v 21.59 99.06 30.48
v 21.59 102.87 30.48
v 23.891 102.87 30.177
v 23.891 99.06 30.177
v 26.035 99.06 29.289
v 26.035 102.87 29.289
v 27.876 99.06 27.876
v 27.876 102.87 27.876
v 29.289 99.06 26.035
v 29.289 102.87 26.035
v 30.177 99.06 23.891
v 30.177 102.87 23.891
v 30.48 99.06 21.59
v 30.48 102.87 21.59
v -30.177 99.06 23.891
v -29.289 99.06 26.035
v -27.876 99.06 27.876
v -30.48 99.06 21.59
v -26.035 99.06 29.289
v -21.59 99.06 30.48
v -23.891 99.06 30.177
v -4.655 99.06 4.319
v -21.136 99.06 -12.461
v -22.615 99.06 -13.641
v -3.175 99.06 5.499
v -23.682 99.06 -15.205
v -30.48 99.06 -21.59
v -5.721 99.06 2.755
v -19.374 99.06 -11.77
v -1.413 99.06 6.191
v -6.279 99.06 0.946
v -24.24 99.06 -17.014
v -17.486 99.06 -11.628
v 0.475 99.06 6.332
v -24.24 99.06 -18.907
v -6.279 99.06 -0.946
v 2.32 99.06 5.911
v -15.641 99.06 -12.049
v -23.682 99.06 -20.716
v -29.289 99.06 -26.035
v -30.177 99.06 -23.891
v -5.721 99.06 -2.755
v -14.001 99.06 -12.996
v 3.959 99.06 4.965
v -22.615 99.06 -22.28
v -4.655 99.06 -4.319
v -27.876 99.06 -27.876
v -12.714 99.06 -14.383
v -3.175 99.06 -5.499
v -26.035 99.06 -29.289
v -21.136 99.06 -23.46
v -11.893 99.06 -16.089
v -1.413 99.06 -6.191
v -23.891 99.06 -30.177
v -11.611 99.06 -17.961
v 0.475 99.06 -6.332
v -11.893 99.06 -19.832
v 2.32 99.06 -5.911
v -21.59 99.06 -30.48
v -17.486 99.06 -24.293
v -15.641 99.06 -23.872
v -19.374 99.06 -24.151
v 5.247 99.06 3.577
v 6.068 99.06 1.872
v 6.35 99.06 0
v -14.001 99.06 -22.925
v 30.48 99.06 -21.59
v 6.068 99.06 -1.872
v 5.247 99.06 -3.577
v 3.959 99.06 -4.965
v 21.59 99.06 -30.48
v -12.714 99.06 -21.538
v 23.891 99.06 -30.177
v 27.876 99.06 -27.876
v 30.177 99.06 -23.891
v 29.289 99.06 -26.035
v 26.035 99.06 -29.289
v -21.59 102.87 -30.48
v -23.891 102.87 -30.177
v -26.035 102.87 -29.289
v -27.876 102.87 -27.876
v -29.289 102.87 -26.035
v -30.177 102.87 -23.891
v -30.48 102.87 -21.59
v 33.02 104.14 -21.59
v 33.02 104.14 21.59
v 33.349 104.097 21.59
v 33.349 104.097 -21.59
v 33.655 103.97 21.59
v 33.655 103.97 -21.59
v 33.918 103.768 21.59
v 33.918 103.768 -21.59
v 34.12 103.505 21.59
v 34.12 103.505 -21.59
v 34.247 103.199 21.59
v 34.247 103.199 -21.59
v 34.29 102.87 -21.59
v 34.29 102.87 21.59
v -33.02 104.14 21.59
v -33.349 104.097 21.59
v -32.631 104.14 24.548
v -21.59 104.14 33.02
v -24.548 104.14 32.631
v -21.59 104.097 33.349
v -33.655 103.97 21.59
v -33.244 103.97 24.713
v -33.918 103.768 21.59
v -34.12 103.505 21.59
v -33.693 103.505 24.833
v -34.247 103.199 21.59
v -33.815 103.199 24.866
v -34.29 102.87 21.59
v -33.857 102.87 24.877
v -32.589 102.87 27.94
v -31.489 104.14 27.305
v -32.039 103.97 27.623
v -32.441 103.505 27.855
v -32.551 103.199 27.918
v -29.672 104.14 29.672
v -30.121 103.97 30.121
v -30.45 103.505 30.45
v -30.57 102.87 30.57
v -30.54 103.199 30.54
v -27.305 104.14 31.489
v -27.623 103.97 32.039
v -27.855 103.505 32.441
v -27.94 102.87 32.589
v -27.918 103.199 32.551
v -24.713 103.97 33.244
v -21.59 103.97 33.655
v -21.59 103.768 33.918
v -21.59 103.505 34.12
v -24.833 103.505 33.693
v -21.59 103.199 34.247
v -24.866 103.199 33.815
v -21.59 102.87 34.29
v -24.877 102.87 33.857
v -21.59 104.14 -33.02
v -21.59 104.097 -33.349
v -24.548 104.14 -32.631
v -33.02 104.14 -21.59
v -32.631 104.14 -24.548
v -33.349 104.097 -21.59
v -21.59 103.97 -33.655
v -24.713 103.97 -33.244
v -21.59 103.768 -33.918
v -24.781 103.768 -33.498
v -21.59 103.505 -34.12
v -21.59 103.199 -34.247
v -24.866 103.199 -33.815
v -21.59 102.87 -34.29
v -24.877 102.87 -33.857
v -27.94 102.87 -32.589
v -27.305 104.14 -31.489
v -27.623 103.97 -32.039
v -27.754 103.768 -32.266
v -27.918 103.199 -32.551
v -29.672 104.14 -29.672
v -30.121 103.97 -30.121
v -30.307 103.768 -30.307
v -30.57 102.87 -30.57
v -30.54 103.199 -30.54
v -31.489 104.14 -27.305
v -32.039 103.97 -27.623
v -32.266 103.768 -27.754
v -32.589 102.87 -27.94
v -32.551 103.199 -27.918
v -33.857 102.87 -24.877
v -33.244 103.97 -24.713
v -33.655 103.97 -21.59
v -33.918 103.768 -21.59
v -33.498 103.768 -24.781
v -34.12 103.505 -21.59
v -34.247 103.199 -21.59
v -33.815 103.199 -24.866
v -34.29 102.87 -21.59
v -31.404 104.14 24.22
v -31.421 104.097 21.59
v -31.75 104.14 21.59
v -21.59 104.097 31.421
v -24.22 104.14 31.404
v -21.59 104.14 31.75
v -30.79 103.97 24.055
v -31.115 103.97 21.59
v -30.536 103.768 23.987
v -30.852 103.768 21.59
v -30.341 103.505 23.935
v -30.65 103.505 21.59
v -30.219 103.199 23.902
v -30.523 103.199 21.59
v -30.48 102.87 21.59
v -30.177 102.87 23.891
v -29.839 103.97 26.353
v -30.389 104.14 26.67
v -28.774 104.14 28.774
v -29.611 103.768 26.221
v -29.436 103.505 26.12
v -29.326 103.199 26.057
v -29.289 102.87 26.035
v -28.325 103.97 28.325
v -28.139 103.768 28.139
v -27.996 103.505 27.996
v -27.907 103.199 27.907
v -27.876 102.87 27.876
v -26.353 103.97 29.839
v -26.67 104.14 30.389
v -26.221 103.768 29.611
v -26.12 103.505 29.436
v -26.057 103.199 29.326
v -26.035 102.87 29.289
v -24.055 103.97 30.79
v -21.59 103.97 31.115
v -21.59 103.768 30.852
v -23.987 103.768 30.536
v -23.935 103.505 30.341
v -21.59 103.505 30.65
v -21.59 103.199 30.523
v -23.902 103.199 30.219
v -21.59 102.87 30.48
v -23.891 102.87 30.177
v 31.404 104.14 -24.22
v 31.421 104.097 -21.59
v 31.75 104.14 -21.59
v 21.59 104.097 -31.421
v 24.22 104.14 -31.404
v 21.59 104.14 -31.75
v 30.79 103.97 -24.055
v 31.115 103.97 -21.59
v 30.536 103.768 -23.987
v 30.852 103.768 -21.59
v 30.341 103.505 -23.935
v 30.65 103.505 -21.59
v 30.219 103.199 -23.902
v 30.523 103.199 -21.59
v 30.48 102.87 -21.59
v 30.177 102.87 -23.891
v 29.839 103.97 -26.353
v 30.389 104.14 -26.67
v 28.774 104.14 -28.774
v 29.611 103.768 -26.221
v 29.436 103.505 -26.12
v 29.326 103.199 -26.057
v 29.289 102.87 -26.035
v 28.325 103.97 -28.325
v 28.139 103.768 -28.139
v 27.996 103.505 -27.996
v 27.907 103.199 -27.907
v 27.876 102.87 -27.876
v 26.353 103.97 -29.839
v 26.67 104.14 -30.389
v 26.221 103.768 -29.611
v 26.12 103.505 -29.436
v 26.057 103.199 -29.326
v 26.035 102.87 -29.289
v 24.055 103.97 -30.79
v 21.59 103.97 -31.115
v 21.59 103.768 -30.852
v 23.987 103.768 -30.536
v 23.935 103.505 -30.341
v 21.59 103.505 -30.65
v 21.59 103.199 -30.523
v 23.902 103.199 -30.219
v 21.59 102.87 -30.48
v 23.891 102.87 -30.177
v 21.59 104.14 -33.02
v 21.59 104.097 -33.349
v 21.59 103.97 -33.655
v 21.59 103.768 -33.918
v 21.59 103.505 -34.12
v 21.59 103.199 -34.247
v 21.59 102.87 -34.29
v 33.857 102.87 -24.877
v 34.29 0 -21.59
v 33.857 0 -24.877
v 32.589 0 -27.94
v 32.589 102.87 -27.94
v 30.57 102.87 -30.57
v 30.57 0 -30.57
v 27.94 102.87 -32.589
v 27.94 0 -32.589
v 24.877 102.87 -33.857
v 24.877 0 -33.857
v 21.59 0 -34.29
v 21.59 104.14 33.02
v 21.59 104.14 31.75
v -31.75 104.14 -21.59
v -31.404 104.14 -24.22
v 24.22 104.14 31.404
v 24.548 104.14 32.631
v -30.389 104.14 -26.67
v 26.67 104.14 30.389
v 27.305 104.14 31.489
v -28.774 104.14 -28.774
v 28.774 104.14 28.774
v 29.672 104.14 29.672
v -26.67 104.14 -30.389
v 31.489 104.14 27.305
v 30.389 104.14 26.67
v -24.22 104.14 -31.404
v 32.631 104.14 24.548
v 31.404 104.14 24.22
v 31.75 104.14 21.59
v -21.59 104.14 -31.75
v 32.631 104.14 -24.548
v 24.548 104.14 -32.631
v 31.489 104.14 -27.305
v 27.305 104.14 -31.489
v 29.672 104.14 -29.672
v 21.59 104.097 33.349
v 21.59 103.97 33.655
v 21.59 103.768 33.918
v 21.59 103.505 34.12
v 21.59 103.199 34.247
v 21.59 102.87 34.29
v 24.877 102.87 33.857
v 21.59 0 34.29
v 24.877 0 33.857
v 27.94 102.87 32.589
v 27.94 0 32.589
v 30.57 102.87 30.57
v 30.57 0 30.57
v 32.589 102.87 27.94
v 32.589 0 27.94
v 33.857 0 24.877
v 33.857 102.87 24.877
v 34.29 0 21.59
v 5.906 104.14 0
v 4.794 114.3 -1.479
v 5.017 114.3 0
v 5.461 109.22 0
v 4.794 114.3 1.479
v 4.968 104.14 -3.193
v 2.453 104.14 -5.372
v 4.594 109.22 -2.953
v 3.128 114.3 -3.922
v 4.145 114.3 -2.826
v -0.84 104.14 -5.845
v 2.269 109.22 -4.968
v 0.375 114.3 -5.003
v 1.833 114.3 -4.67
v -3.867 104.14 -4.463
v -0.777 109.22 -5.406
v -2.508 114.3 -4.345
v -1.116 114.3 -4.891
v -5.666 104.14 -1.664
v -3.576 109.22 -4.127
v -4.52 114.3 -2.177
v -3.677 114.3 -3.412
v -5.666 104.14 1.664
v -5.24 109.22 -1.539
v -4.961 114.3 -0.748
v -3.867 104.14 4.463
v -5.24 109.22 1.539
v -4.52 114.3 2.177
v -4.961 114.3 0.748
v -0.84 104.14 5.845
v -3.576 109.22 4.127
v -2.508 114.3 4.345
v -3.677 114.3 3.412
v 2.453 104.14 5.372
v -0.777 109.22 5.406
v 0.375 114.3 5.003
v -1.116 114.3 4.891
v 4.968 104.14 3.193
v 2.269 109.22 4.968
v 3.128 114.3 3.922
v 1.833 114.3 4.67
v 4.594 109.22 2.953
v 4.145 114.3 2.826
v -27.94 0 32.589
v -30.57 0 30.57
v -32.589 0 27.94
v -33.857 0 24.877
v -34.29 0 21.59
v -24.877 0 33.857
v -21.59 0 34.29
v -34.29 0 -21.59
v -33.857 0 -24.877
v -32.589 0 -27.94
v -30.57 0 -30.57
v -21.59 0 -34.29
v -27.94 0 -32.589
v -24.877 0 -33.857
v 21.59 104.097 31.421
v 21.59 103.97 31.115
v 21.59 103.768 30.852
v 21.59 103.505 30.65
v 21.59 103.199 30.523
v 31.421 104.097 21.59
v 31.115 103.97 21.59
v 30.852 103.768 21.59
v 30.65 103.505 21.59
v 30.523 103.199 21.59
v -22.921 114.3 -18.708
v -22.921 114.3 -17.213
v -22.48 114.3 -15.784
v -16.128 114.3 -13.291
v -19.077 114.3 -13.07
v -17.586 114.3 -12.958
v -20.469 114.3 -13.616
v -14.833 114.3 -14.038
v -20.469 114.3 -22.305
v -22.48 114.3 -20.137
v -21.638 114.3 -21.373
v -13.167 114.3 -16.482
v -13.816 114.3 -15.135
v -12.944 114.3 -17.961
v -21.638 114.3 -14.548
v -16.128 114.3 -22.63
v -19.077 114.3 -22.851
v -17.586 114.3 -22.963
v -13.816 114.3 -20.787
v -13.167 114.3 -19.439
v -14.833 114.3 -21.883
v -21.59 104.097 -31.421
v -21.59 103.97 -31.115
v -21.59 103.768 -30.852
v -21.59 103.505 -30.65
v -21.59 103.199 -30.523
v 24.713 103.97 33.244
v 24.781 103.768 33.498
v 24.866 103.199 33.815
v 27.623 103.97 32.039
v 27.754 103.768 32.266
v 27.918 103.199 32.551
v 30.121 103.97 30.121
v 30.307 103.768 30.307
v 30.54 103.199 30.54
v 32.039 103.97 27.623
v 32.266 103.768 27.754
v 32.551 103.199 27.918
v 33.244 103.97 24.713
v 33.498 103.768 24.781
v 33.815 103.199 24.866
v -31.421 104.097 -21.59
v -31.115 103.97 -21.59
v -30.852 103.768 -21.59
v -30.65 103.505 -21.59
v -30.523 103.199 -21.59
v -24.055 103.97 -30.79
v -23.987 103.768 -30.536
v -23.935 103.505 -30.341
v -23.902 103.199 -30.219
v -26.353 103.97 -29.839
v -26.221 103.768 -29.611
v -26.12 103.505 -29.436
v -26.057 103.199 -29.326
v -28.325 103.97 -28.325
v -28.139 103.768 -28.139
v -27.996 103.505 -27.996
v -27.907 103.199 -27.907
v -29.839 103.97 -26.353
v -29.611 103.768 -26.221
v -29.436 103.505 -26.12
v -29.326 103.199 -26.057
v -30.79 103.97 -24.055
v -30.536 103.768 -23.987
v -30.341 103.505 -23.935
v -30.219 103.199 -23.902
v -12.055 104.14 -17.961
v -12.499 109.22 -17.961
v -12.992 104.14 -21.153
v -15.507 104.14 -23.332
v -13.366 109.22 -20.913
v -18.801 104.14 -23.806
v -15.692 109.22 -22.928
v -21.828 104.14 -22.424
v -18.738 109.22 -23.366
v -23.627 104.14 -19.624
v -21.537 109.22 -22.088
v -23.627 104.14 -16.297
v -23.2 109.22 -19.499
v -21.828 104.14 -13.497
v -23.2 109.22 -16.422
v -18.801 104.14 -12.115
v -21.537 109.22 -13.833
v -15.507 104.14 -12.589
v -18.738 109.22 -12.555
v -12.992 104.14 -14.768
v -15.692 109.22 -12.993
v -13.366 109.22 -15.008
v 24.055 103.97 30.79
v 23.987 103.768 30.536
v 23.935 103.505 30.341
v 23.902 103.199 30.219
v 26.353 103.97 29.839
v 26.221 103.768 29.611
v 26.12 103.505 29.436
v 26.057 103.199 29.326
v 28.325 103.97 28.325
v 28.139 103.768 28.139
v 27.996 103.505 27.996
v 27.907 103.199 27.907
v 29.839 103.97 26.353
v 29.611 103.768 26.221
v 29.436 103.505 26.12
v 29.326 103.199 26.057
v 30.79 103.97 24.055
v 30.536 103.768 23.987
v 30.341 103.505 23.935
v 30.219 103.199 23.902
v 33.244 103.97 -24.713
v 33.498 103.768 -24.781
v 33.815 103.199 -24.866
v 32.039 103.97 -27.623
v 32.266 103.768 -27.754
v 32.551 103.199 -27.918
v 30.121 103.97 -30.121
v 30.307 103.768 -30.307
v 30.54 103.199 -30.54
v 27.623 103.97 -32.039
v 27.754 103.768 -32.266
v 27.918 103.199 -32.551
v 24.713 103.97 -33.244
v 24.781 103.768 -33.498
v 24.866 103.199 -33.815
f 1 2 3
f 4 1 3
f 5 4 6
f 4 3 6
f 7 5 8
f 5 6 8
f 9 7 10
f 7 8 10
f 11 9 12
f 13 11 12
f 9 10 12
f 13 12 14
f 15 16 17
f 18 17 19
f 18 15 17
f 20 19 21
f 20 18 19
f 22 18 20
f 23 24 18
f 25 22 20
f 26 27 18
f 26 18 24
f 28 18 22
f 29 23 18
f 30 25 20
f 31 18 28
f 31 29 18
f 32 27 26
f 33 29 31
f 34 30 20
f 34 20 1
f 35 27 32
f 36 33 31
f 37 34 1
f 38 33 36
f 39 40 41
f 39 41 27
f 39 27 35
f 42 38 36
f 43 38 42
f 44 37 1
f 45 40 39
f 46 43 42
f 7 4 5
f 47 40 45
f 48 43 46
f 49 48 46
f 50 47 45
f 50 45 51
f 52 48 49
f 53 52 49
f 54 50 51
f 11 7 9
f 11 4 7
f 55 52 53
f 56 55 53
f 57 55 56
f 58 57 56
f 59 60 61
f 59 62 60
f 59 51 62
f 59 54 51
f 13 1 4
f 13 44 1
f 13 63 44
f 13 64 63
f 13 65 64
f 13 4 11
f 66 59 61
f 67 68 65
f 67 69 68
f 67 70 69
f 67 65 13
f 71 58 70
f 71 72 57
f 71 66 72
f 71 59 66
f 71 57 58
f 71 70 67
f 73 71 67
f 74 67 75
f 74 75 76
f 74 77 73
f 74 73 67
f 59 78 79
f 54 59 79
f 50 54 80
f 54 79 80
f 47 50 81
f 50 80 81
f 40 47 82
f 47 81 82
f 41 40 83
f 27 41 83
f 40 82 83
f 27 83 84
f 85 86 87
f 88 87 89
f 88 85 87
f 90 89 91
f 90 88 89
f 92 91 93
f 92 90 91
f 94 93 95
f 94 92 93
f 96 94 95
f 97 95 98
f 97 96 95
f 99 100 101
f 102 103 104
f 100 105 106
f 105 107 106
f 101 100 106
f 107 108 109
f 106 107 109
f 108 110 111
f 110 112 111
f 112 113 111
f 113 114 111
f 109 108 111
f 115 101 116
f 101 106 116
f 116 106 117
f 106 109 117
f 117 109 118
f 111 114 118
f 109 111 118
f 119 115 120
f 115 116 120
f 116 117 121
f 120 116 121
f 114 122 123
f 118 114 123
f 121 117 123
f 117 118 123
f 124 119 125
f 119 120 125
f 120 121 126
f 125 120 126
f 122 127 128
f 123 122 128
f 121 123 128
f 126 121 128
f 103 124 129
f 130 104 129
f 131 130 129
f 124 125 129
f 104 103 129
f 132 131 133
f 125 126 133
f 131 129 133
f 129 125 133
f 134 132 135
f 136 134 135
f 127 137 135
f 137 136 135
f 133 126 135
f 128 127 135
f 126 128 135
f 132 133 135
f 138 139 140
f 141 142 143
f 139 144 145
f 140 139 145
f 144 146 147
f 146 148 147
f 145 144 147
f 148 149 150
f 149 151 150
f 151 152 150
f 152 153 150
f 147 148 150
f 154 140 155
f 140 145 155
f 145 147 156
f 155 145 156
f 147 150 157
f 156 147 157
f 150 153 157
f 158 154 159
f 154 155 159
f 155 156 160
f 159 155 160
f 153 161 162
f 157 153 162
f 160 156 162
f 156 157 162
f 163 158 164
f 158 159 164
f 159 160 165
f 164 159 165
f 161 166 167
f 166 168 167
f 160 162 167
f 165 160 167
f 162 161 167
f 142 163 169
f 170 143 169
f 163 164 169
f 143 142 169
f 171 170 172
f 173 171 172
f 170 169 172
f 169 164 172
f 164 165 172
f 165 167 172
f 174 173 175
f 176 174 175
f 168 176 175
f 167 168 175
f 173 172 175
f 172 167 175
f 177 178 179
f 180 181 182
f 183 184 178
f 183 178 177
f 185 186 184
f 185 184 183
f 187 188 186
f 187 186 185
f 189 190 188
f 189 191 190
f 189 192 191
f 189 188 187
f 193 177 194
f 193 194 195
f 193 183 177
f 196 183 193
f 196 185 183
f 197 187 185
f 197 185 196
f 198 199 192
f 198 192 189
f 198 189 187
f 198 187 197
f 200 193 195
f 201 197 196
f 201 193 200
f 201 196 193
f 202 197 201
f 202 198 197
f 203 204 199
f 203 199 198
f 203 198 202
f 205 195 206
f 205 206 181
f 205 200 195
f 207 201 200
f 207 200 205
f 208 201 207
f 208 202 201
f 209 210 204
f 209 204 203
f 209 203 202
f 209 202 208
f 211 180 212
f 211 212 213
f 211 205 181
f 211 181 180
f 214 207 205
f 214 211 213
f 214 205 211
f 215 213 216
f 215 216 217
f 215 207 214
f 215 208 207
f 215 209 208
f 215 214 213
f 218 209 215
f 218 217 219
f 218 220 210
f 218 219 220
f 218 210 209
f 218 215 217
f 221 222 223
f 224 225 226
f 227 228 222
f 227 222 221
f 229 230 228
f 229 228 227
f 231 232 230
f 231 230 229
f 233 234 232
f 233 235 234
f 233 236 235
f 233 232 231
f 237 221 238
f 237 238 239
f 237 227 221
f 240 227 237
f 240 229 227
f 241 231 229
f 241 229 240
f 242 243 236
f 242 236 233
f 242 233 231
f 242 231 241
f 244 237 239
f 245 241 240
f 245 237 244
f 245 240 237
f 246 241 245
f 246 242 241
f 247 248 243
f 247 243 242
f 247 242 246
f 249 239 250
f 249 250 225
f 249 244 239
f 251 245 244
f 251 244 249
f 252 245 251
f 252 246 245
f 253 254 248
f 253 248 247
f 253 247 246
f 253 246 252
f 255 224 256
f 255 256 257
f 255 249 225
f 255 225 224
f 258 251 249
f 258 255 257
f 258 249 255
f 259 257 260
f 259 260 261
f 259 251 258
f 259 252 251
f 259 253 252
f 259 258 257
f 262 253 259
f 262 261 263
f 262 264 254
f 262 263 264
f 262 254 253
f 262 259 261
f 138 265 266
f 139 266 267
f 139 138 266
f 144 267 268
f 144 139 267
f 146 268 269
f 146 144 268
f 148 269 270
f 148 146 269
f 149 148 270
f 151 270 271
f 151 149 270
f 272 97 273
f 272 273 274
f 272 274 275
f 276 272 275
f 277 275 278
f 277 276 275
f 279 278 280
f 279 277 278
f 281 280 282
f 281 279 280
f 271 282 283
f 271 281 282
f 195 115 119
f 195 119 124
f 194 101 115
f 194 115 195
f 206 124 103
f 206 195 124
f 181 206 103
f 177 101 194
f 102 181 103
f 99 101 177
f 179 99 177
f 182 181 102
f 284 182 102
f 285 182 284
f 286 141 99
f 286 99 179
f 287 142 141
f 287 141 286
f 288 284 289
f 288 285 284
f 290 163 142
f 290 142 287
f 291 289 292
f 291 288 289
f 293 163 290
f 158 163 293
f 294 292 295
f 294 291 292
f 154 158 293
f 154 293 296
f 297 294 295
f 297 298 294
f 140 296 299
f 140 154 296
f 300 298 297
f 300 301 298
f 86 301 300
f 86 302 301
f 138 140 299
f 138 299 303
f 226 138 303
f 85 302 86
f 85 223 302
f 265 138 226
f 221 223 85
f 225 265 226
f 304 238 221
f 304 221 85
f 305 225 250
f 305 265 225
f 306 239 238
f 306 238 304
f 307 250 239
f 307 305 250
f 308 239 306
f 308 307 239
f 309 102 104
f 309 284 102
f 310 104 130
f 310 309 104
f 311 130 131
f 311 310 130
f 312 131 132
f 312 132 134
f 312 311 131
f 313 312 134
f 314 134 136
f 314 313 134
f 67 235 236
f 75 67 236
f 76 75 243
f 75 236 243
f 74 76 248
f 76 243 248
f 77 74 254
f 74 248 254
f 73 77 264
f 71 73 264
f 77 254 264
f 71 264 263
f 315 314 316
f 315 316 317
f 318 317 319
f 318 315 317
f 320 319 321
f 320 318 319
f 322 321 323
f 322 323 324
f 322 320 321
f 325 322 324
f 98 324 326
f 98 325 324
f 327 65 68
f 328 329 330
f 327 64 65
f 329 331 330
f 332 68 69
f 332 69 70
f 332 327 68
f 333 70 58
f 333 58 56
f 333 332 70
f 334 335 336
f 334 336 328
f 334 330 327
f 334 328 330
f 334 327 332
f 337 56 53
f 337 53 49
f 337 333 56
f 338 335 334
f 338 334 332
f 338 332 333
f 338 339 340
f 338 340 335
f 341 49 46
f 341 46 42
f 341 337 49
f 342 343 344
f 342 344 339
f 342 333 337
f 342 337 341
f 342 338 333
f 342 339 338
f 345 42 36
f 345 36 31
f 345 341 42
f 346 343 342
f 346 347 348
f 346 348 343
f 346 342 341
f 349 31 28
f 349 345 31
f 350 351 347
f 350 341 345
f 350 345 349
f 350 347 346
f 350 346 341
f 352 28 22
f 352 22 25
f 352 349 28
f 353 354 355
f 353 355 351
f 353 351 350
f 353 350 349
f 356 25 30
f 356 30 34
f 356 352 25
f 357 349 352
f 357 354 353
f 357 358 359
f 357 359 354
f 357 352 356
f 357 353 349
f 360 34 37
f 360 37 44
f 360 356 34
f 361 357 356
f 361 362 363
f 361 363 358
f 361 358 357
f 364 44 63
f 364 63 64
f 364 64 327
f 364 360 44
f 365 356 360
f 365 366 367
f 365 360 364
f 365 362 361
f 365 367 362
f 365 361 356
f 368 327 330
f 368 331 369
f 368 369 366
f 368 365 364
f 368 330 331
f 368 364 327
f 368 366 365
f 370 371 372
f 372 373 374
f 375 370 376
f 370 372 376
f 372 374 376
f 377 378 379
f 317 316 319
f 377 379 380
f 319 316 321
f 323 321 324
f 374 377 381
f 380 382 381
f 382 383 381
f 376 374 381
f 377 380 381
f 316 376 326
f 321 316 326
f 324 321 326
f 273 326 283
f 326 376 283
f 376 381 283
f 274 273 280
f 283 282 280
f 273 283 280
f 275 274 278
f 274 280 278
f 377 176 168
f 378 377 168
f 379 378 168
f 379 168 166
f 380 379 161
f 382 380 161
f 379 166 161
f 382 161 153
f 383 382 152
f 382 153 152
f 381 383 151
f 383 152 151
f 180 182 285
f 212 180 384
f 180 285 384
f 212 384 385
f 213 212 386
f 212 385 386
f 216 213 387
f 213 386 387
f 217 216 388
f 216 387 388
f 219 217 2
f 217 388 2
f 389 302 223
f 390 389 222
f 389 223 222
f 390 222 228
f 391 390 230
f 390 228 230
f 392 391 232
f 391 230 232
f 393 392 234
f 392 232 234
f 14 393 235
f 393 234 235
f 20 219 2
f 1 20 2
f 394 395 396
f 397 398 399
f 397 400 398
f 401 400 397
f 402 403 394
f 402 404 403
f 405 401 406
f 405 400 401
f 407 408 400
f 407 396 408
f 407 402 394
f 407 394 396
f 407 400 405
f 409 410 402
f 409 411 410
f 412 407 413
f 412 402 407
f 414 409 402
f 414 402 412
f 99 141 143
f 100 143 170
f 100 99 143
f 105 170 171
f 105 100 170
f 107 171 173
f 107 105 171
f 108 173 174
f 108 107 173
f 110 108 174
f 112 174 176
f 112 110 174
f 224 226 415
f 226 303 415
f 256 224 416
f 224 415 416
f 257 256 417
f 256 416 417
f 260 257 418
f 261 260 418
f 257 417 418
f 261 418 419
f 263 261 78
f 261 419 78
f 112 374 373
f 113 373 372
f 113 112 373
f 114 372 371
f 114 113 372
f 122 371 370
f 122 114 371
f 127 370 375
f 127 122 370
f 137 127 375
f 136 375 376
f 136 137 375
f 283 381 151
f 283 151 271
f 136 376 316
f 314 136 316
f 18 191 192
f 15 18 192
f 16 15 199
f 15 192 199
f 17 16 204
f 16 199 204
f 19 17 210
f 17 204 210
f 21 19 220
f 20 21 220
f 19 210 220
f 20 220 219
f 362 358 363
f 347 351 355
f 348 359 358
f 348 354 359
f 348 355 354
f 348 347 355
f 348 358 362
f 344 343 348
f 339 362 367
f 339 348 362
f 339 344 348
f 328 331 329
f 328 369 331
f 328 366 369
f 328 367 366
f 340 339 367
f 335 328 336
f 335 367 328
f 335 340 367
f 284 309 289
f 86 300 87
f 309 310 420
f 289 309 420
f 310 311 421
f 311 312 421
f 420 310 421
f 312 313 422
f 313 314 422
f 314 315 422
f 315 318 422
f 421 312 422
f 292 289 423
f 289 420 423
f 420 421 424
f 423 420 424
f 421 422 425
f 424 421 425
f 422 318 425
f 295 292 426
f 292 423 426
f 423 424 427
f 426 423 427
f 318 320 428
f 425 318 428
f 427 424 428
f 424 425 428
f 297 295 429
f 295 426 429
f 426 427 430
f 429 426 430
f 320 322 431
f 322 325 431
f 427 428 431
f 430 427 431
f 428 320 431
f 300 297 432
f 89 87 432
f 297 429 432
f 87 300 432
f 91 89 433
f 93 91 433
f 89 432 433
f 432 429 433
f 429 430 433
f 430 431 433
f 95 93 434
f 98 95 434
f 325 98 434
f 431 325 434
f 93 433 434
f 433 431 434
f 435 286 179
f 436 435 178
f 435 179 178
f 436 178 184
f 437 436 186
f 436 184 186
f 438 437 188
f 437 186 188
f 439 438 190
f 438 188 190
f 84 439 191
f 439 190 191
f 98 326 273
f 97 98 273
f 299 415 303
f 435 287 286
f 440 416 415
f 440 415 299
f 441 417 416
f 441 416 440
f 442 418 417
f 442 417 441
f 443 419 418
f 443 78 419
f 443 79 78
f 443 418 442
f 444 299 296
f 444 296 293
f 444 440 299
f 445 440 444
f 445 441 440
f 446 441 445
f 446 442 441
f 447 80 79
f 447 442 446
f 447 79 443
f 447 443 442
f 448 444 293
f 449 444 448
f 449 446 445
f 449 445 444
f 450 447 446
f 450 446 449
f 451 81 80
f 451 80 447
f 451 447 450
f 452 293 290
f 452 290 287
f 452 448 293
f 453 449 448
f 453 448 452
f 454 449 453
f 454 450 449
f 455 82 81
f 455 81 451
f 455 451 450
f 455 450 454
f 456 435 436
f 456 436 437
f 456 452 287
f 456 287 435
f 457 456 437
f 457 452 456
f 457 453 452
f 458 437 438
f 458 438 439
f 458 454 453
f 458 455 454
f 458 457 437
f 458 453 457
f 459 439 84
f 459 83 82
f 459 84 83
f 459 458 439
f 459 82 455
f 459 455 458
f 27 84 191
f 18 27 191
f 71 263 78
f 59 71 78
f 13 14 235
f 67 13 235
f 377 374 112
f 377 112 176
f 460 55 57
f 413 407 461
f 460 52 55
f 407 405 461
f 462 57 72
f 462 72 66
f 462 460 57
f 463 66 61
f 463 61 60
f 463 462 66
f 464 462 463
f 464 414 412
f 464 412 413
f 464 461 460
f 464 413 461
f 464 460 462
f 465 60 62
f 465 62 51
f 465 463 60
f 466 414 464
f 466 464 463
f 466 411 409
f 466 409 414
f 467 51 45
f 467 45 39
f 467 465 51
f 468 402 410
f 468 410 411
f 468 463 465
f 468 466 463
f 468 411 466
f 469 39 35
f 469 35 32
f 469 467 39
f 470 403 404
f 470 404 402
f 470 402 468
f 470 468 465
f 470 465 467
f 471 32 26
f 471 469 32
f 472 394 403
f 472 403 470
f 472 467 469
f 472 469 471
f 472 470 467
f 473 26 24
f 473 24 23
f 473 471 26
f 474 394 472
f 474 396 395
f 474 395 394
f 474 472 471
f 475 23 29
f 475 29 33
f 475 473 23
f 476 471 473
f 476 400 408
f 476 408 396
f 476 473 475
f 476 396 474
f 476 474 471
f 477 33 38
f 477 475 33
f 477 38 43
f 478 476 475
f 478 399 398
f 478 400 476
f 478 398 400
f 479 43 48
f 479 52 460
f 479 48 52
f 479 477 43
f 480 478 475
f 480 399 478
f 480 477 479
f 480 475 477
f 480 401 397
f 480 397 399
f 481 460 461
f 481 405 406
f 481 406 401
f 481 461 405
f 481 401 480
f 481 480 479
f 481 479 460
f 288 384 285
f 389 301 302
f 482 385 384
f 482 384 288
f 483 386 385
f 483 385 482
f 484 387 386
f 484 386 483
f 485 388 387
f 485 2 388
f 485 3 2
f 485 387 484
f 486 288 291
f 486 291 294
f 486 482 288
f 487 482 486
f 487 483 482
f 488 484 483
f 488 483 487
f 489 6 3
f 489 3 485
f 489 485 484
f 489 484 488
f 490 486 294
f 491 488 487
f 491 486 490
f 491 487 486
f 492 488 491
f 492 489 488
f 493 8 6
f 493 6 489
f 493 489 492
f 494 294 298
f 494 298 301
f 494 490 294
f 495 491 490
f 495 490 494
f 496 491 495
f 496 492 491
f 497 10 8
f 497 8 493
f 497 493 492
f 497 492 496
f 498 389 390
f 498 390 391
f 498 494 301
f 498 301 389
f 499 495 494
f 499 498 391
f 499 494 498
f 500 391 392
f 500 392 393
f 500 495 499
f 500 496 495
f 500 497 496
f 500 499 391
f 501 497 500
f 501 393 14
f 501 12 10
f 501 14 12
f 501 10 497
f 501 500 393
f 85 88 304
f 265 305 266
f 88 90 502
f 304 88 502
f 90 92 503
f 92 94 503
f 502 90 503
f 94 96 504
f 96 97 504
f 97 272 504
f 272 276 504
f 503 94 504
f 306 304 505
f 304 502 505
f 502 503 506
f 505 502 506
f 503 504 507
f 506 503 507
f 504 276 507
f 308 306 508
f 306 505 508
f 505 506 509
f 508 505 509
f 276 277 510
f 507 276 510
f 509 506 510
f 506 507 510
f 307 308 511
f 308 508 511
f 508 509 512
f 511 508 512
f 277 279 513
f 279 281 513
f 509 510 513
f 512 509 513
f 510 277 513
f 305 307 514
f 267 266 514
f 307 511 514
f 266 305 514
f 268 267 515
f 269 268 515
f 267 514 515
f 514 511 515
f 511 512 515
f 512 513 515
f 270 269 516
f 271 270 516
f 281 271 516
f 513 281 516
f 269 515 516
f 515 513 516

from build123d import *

# Parameters (mm, degrees)
SKETCH2_W          = 68.58
SKETCH2_H          = 68.58
BASE_EXTRUDE_DEPTH = 104.14
SIDE_FILLETS_R     = 12.7
TOP_CUT_DEPTH      = 5.08
TOP_FACE_FILLET_R  = 1.27
SKETCH9_R          = 6.35
TERMINALS_DEPTH    = 15.24
TERMINALS_TAPER    = 5


with BuildPart() as part:
    # Sketch2 → Base-Extrude (new body)
    with BuildSketch(Plane(origin=(0, 0, 0), x_dir=(1, 0, 0), z_dir=(0, 1, 0))):
        Rectangle(SKETCH2_W, SKETCH2_H)
    extrude(amount=BASE_EXTRUDE_DEPTH)

    # Side Fillets
    side_fillets_edges = [part.edges().sort_by_distance(p)[0] for p in [
        (34.29, 52.07, 34.29),
        (-34.29, 52.07, 34.29),
        (-34.29, 52.07, -34.29),
        (34.29, 52.07, -34.29),
    ]]
    fillet(side_fillets_edges, radius=SIDE_FILLETS_R)

    # Sketch5 → Top Cut (cut)
    with BuildSketch(Plane(origin=(0, 104.14, 0), x_dir=(1, 0, 0), z_dir=(0, 1, 0))):
        with BuildLine():
            Line((-30.48, 21.59), (-30.48, -21.59))
            ThreePointArc((-30.48, -21.59), (-27.876179285, -27.876179285), (-21.59, -30.48))
            Line((-21.59, -30.48), (21.59, -30.48))
            ThreePointArc((21.59, -30.48), (27.876179285, -27.876179285), (30.48, -21.59))
            Line((30.48, -21.59), (30.48, 21.59))
            ThreePointArc((30.48, 21.59), (27.876179285, 27.876179285), (21.59, 30.48))
            Line((21.59, 30.48), (-21.59, 30.48))
            ThreePointArc((-21.59, 30.48), (-27.876179285, 27.876179285), (-30.48, 21.59))
        make_face()
    extrude(amount=-TOP_CUT_DEPTH, mode=Mode.SUBTRACT)

    # Top Face Fillet
    top_face_fillet_edges = [part.edges().sort_by_distance(p)[0] for p in [
        (0, 104.14, 34.29),
        (-34.29, 104.14, 0),
        (34.29, 104.14, 0),
        (0, 104.14, -34.29),
        (30.570256121, 104.14, 30.570256121),
        (30.570256121, 104.14, -30.570256121),
        (-30.570256121, 104.14, -30.570256121),
        (-30.570256121, 104.14, 30.570256121),
        (-27.876179285, 104.14, -27.876179285),
        (-30.48, 104.14, 0),
        (-27.876179285, 104.14, 27.876179285),
        (0, 104.14, 30.48),
        (27.876179285, 104.14, 27.876179285),
        (30.48, 104.14, 0),
        (27.876179285, 104.14, -27.876179285),
        (0, 104.14, -30.48),
    ]]
    fillet(top_face_fillet_edges, radius=TOP_FACE_FILLET_R)

    # Sketch9 → Terminals (add)
    with BuildSketch(Plane(origin=(0, 99.06, 0), x_dir=(1, 0, 0), z_dir=(0, 1, 0))):
        Circle(SKETCH9_R)
        with Locations((-17.960512242, 17.960512242)):
            Circle(SKETCH9_R)
    extrude(amount=TERMINALS_DEPTH, taper=TERMINALS_TAPER)


solid = part.part
